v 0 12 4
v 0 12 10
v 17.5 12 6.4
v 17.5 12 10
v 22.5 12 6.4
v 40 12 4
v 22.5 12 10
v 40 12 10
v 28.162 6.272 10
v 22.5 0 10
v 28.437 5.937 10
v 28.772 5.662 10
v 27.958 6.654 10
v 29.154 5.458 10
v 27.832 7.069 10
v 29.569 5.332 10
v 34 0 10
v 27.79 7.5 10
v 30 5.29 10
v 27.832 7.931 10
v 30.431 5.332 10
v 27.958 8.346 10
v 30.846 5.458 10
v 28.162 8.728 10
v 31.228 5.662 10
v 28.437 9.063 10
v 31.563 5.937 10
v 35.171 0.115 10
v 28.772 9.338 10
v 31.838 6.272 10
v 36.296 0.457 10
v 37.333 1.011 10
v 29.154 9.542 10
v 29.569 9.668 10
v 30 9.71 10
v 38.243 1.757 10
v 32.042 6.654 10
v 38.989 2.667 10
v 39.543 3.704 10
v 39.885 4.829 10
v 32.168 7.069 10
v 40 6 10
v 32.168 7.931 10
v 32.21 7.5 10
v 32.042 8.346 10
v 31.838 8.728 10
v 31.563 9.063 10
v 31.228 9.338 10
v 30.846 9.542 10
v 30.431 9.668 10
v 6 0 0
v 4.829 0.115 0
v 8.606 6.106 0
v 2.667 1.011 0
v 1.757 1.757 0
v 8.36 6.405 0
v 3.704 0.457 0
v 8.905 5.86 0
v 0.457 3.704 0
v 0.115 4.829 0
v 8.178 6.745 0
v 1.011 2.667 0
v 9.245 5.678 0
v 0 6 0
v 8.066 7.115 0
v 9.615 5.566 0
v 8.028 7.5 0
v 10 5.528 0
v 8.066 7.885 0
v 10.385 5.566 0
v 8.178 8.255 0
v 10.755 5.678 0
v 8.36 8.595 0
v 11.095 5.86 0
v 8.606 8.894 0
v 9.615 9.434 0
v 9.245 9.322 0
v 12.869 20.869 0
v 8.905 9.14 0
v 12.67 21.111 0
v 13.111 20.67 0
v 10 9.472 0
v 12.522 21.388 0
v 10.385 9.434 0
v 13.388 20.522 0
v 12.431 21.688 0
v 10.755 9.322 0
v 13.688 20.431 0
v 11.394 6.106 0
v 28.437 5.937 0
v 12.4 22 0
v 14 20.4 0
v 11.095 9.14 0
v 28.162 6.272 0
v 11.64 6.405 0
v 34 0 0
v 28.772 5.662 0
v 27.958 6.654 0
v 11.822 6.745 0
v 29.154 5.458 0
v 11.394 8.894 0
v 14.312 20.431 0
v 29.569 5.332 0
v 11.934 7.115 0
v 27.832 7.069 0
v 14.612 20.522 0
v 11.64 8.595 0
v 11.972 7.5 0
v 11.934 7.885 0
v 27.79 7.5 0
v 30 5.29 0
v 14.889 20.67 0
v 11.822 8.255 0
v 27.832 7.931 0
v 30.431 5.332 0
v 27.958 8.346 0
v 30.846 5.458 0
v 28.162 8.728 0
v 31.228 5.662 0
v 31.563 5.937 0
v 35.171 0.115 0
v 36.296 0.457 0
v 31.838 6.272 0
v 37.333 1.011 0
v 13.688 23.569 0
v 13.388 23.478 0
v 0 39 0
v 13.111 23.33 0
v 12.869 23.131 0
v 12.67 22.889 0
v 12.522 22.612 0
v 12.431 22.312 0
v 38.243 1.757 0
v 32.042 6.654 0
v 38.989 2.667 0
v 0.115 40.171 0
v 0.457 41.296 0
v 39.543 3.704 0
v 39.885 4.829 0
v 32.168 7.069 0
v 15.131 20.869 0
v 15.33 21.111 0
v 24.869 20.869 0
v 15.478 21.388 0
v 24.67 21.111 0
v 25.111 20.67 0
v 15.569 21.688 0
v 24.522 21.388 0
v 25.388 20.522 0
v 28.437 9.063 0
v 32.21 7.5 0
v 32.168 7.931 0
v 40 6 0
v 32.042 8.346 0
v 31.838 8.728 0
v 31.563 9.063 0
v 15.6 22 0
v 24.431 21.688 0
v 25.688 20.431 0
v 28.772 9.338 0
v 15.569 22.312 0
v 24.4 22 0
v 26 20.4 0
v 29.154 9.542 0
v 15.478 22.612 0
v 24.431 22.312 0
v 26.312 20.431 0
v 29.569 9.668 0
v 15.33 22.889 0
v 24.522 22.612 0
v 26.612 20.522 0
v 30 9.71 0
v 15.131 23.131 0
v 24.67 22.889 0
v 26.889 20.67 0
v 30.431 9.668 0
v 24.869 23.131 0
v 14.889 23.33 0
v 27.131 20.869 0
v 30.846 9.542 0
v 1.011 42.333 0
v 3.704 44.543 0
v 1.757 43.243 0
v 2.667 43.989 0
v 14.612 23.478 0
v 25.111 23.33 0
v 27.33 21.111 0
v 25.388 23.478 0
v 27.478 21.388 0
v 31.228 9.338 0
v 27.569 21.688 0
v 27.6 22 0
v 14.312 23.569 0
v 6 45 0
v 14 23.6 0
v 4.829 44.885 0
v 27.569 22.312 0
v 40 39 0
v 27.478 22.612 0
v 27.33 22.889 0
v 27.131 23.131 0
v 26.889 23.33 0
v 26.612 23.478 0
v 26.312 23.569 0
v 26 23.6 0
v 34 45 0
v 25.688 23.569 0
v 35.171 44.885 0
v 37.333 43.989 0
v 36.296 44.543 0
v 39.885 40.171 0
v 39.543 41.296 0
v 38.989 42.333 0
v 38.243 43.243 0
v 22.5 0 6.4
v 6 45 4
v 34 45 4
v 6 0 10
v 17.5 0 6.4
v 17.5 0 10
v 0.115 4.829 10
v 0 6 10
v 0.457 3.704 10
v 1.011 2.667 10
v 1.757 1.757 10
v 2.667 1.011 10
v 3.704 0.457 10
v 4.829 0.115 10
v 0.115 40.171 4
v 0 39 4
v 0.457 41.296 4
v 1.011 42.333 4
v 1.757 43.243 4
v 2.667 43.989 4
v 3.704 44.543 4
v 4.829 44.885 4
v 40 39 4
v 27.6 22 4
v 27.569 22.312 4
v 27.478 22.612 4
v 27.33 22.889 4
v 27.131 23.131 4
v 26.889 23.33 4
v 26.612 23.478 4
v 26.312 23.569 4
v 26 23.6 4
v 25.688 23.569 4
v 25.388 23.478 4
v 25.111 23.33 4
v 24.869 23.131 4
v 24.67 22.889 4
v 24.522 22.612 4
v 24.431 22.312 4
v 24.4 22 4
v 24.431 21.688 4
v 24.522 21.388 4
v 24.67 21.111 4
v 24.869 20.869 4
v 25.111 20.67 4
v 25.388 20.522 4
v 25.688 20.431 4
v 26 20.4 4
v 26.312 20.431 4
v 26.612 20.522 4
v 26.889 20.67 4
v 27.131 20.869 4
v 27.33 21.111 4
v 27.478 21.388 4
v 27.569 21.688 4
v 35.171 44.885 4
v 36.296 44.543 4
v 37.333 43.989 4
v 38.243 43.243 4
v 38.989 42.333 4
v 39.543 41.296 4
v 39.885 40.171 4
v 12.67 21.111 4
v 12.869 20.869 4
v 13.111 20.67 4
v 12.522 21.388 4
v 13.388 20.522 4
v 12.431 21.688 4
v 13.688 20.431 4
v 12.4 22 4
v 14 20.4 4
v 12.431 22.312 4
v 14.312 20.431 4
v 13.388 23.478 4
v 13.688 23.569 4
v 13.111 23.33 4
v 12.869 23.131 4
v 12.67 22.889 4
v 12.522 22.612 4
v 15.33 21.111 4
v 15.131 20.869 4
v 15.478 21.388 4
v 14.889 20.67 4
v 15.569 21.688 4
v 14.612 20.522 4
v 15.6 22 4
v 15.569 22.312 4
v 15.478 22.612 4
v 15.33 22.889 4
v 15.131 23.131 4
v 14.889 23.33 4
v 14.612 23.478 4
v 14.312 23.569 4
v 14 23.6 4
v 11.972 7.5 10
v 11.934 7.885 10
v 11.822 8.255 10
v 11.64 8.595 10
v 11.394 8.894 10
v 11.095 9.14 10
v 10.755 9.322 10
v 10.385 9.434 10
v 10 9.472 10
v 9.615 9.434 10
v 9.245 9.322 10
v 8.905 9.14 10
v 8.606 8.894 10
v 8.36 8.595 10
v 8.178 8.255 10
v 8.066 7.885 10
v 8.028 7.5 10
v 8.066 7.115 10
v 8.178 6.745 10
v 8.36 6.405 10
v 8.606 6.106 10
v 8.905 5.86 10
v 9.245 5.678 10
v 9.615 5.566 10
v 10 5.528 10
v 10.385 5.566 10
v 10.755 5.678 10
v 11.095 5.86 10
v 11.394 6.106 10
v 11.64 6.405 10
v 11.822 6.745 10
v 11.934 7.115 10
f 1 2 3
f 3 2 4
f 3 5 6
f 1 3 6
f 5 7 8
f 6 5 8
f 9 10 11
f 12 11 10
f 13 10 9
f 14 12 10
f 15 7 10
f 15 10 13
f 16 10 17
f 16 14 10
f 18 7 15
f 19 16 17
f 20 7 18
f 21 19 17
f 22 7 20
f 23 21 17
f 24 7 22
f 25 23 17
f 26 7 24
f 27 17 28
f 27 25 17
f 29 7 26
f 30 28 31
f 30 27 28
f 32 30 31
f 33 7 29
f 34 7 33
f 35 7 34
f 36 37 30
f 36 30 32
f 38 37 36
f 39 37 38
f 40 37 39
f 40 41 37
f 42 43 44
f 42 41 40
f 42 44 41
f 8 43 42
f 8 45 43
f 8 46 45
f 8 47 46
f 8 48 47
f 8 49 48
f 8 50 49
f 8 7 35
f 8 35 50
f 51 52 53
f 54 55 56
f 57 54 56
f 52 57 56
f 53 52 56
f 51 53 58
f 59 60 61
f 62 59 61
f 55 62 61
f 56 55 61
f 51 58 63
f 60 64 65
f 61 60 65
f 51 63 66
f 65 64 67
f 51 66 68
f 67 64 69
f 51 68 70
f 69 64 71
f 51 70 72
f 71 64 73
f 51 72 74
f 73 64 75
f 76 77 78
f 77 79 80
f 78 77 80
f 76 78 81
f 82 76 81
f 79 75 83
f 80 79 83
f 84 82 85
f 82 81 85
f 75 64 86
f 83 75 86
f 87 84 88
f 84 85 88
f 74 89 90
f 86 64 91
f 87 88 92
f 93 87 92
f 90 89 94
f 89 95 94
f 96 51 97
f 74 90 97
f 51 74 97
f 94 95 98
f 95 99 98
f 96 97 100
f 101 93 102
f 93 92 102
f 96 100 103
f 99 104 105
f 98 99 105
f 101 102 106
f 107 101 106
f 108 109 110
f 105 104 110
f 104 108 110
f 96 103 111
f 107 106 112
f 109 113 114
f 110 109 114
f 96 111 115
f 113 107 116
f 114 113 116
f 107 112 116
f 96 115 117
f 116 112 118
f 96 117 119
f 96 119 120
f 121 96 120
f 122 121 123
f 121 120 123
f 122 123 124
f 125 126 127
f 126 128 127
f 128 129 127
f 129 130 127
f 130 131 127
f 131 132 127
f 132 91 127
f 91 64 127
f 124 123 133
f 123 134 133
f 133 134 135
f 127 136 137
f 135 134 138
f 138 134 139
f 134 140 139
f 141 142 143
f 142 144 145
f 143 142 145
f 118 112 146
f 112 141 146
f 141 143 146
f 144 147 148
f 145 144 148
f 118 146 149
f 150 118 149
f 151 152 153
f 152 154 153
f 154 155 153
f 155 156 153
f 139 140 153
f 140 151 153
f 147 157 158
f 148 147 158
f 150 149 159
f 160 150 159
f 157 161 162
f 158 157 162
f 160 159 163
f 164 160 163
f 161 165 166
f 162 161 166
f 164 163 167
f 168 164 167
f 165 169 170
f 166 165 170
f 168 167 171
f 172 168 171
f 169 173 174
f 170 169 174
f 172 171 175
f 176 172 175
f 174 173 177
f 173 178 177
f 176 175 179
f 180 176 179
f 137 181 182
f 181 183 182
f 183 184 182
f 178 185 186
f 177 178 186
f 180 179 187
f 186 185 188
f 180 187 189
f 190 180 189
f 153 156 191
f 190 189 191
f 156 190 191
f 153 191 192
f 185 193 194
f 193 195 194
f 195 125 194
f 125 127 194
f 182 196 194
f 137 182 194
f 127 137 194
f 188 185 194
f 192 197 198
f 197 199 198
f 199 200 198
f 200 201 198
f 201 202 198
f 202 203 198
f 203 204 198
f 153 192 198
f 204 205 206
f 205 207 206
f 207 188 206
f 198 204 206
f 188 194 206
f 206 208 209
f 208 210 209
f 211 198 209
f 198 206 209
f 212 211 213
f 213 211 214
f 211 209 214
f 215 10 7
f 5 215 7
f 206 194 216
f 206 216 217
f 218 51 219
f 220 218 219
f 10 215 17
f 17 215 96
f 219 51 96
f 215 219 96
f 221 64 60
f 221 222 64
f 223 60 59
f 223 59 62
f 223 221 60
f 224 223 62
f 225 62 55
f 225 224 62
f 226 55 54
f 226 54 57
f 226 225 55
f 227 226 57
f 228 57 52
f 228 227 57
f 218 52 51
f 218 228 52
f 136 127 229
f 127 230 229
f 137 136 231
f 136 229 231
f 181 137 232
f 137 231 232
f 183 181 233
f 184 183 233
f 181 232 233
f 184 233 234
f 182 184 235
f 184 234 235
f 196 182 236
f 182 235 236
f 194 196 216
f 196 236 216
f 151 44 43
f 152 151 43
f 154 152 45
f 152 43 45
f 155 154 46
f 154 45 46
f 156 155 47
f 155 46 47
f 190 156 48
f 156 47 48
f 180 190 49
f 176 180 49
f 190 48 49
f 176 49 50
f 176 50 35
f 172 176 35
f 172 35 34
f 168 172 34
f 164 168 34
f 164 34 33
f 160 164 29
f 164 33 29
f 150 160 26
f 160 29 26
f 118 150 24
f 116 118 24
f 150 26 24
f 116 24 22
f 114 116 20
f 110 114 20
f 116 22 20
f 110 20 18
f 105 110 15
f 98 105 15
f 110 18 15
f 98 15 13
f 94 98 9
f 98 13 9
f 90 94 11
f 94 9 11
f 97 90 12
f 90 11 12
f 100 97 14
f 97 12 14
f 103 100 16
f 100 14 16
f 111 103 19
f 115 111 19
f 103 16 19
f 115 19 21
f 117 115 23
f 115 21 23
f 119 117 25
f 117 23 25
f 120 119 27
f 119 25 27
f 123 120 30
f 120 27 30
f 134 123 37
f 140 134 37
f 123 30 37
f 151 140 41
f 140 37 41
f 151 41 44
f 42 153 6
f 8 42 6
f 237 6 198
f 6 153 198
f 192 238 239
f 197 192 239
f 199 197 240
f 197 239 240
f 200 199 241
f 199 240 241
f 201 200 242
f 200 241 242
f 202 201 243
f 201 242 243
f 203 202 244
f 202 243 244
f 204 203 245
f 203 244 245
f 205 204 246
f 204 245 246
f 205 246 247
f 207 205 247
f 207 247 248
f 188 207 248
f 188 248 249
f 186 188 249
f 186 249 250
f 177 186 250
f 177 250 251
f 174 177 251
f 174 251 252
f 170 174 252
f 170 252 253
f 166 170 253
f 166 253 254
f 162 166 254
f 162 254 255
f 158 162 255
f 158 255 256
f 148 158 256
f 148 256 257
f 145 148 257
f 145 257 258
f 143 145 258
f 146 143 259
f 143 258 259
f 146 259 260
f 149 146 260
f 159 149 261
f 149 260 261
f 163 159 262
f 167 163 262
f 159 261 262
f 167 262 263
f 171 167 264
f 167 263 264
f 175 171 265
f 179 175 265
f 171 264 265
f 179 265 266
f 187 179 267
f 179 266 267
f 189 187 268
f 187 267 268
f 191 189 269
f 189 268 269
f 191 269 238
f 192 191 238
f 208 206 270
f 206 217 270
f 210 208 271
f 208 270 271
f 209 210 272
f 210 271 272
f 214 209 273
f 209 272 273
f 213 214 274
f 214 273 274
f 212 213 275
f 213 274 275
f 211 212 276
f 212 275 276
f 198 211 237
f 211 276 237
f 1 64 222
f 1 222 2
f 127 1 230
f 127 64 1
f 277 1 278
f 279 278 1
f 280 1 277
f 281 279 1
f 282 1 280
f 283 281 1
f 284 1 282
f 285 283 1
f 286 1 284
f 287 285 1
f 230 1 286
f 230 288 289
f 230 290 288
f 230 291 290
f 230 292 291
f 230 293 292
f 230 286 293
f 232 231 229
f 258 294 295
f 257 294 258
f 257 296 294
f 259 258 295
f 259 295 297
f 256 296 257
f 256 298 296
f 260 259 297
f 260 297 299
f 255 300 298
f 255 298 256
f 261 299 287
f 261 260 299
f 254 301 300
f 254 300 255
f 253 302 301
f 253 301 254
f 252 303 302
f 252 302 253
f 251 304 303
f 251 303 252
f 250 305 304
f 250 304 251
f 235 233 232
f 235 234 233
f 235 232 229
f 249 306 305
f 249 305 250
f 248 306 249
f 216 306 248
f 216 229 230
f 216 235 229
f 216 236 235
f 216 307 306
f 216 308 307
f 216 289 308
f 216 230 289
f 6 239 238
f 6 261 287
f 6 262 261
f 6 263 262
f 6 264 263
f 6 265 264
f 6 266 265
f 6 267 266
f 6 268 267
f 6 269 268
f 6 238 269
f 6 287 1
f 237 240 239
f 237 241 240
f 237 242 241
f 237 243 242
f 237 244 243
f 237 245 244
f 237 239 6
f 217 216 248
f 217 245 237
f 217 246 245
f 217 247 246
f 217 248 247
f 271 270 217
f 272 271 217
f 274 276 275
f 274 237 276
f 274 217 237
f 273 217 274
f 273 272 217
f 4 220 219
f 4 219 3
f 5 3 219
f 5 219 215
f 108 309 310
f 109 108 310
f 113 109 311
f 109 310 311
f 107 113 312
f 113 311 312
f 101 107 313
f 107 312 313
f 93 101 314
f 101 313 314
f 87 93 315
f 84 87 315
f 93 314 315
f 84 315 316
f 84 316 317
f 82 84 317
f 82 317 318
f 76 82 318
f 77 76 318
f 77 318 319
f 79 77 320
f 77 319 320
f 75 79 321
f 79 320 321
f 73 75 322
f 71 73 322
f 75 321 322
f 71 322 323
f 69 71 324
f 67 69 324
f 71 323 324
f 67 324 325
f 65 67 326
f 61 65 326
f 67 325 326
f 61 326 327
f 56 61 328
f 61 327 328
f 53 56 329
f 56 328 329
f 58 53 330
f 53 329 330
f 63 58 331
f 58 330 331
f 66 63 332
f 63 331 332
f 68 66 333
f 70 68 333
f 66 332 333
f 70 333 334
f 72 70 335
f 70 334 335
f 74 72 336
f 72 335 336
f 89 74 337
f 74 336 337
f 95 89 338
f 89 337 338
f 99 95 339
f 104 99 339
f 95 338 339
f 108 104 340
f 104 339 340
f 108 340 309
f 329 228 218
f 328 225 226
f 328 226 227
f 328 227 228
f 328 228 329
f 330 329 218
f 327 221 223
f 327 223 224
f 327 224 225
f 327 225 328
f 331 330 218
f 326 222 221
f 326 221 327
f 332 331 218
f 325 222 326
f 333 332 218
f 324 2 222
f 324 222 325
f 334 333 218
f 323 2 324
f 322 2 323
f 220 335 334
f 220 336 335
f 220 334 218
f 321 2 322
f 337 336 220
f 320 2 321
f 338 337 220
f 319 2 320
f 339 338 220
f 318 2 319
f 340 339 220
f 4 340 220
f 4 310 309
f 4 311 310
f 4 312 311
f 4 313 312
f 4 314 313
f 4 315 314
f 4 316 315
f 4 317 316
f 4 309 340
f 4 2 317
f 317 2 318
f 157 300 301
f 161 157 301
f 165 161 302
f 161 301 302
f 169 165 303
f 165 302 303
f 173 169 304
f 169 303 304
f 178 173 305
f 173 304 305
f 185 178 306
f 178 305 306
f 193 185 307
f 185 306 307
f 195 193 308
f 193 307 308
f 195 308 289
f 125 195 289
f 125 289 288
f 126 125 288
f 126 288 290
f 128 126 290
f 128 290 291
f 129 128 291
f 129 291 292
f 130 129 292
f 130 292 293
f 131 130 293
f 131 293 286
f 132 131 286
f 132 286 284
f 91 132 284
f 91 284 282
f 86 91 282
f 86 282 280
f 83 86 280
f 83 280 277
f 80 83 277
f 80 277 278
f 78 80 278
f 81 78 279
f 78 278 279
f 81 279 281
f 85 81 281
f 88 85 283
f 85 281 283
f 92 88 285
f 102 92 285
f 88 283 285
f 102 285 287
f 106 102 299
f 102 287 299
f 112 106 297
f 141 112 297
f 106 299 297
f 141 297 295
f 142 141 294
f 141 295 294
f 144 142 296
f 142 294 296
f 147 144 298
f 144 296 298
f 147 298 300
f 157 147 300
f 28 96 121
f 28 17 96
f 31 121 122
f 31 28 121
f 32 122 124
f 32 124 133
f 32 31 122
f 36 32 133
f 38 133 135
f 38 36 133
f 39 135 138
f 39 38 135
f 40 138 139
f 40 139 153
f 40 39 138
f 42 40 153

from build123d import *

# Parameters (mm, degrees)
SKETCH_W        = 40
SKETCH_H        = 45
PAD_DEPTH       = 10
SKETCH001_R     = 1.971831
SKETCH001_R_2   = 2.210302
POCKET_DEPTH    = 10
SKETCH002_W     = 40
SKETCH002_H     = 33
POCKET001_DEPTH = 6
SKETCH003_R     = 1.6
POCKET002_DEPTH = 5
SKETCH004_W     = 5
SKETCH004_H     = 12.28172
POCKET003_DEPTH = 3.6
FILLET_R        = 6


with BuildPart() as part:
    # Sketch → Pad (new body)
    with BuildSketch(Plane.XY):
        with Locations((20, 22.5)):
            Rectangle(SKETCH_W, SKETCH_H)
    extrude(amount=PAD_DEPTH)

    # Sketch001 (on Face6 of Pad) → Pocket (cut)
    with BuildSketch(Plane.XY.offset(10)):
        with Locations((10, 7.5)):
            Circle(SKETCH001_R)
        with Locations((30, 7.5)):
            Circle(SKETCH001_R_2)
    extrude(amount=-POCKET_DEPTH, mode=Mode.SUBTRACT)

    # Sketch002 (on Face5 of Pocket) → Pocket001 (cut)
    with BuildSketch(Plane.XY.offset(10)):
        with Locations((20, 28.5)):
            Rectangle(SKETCH002_W, SKETCH002_H)
    extrude(amount=-POCKET001_DEPTH, mode=Mode.SUBTRACT)

    # Sketch003 (on Face7 of Pocket001) → Pocket002 (cut)
    with BuildSketch(Plane.XY.offset(4)):
        with Locations((14, 21.999999)):
            Circle(SKETCH003_R)
        with Locations((26, 22)):
            Circle(SKETCH003_R)
    extrude(amount=-POCKET002_DEPTH, mode=Mode.SUBTRACT)

    # Sketch004 (on Face5 of Pocket002) → Pocket003 (cut)
    with BuildSketch(Plane.XY.offset(10)):
        with Locations((20, 6.14086)):
            Rectangle(SKETCH004_W, SKETCH004_H)
    extrude(amount=-POCKET003_DEPTH, mode=Mode.SUBTRACT)

    # Fillet
    fillet_edges = [part.edges().sort_by_distance(p)[0] for p in [
        (40, 0, 5),
        (0, 0, 5),
        (40, 45, 2),
        (0, 45, 2),
    ]]
    fillet(fillet_edges, radius=FILLET_R)


solid = part.part
